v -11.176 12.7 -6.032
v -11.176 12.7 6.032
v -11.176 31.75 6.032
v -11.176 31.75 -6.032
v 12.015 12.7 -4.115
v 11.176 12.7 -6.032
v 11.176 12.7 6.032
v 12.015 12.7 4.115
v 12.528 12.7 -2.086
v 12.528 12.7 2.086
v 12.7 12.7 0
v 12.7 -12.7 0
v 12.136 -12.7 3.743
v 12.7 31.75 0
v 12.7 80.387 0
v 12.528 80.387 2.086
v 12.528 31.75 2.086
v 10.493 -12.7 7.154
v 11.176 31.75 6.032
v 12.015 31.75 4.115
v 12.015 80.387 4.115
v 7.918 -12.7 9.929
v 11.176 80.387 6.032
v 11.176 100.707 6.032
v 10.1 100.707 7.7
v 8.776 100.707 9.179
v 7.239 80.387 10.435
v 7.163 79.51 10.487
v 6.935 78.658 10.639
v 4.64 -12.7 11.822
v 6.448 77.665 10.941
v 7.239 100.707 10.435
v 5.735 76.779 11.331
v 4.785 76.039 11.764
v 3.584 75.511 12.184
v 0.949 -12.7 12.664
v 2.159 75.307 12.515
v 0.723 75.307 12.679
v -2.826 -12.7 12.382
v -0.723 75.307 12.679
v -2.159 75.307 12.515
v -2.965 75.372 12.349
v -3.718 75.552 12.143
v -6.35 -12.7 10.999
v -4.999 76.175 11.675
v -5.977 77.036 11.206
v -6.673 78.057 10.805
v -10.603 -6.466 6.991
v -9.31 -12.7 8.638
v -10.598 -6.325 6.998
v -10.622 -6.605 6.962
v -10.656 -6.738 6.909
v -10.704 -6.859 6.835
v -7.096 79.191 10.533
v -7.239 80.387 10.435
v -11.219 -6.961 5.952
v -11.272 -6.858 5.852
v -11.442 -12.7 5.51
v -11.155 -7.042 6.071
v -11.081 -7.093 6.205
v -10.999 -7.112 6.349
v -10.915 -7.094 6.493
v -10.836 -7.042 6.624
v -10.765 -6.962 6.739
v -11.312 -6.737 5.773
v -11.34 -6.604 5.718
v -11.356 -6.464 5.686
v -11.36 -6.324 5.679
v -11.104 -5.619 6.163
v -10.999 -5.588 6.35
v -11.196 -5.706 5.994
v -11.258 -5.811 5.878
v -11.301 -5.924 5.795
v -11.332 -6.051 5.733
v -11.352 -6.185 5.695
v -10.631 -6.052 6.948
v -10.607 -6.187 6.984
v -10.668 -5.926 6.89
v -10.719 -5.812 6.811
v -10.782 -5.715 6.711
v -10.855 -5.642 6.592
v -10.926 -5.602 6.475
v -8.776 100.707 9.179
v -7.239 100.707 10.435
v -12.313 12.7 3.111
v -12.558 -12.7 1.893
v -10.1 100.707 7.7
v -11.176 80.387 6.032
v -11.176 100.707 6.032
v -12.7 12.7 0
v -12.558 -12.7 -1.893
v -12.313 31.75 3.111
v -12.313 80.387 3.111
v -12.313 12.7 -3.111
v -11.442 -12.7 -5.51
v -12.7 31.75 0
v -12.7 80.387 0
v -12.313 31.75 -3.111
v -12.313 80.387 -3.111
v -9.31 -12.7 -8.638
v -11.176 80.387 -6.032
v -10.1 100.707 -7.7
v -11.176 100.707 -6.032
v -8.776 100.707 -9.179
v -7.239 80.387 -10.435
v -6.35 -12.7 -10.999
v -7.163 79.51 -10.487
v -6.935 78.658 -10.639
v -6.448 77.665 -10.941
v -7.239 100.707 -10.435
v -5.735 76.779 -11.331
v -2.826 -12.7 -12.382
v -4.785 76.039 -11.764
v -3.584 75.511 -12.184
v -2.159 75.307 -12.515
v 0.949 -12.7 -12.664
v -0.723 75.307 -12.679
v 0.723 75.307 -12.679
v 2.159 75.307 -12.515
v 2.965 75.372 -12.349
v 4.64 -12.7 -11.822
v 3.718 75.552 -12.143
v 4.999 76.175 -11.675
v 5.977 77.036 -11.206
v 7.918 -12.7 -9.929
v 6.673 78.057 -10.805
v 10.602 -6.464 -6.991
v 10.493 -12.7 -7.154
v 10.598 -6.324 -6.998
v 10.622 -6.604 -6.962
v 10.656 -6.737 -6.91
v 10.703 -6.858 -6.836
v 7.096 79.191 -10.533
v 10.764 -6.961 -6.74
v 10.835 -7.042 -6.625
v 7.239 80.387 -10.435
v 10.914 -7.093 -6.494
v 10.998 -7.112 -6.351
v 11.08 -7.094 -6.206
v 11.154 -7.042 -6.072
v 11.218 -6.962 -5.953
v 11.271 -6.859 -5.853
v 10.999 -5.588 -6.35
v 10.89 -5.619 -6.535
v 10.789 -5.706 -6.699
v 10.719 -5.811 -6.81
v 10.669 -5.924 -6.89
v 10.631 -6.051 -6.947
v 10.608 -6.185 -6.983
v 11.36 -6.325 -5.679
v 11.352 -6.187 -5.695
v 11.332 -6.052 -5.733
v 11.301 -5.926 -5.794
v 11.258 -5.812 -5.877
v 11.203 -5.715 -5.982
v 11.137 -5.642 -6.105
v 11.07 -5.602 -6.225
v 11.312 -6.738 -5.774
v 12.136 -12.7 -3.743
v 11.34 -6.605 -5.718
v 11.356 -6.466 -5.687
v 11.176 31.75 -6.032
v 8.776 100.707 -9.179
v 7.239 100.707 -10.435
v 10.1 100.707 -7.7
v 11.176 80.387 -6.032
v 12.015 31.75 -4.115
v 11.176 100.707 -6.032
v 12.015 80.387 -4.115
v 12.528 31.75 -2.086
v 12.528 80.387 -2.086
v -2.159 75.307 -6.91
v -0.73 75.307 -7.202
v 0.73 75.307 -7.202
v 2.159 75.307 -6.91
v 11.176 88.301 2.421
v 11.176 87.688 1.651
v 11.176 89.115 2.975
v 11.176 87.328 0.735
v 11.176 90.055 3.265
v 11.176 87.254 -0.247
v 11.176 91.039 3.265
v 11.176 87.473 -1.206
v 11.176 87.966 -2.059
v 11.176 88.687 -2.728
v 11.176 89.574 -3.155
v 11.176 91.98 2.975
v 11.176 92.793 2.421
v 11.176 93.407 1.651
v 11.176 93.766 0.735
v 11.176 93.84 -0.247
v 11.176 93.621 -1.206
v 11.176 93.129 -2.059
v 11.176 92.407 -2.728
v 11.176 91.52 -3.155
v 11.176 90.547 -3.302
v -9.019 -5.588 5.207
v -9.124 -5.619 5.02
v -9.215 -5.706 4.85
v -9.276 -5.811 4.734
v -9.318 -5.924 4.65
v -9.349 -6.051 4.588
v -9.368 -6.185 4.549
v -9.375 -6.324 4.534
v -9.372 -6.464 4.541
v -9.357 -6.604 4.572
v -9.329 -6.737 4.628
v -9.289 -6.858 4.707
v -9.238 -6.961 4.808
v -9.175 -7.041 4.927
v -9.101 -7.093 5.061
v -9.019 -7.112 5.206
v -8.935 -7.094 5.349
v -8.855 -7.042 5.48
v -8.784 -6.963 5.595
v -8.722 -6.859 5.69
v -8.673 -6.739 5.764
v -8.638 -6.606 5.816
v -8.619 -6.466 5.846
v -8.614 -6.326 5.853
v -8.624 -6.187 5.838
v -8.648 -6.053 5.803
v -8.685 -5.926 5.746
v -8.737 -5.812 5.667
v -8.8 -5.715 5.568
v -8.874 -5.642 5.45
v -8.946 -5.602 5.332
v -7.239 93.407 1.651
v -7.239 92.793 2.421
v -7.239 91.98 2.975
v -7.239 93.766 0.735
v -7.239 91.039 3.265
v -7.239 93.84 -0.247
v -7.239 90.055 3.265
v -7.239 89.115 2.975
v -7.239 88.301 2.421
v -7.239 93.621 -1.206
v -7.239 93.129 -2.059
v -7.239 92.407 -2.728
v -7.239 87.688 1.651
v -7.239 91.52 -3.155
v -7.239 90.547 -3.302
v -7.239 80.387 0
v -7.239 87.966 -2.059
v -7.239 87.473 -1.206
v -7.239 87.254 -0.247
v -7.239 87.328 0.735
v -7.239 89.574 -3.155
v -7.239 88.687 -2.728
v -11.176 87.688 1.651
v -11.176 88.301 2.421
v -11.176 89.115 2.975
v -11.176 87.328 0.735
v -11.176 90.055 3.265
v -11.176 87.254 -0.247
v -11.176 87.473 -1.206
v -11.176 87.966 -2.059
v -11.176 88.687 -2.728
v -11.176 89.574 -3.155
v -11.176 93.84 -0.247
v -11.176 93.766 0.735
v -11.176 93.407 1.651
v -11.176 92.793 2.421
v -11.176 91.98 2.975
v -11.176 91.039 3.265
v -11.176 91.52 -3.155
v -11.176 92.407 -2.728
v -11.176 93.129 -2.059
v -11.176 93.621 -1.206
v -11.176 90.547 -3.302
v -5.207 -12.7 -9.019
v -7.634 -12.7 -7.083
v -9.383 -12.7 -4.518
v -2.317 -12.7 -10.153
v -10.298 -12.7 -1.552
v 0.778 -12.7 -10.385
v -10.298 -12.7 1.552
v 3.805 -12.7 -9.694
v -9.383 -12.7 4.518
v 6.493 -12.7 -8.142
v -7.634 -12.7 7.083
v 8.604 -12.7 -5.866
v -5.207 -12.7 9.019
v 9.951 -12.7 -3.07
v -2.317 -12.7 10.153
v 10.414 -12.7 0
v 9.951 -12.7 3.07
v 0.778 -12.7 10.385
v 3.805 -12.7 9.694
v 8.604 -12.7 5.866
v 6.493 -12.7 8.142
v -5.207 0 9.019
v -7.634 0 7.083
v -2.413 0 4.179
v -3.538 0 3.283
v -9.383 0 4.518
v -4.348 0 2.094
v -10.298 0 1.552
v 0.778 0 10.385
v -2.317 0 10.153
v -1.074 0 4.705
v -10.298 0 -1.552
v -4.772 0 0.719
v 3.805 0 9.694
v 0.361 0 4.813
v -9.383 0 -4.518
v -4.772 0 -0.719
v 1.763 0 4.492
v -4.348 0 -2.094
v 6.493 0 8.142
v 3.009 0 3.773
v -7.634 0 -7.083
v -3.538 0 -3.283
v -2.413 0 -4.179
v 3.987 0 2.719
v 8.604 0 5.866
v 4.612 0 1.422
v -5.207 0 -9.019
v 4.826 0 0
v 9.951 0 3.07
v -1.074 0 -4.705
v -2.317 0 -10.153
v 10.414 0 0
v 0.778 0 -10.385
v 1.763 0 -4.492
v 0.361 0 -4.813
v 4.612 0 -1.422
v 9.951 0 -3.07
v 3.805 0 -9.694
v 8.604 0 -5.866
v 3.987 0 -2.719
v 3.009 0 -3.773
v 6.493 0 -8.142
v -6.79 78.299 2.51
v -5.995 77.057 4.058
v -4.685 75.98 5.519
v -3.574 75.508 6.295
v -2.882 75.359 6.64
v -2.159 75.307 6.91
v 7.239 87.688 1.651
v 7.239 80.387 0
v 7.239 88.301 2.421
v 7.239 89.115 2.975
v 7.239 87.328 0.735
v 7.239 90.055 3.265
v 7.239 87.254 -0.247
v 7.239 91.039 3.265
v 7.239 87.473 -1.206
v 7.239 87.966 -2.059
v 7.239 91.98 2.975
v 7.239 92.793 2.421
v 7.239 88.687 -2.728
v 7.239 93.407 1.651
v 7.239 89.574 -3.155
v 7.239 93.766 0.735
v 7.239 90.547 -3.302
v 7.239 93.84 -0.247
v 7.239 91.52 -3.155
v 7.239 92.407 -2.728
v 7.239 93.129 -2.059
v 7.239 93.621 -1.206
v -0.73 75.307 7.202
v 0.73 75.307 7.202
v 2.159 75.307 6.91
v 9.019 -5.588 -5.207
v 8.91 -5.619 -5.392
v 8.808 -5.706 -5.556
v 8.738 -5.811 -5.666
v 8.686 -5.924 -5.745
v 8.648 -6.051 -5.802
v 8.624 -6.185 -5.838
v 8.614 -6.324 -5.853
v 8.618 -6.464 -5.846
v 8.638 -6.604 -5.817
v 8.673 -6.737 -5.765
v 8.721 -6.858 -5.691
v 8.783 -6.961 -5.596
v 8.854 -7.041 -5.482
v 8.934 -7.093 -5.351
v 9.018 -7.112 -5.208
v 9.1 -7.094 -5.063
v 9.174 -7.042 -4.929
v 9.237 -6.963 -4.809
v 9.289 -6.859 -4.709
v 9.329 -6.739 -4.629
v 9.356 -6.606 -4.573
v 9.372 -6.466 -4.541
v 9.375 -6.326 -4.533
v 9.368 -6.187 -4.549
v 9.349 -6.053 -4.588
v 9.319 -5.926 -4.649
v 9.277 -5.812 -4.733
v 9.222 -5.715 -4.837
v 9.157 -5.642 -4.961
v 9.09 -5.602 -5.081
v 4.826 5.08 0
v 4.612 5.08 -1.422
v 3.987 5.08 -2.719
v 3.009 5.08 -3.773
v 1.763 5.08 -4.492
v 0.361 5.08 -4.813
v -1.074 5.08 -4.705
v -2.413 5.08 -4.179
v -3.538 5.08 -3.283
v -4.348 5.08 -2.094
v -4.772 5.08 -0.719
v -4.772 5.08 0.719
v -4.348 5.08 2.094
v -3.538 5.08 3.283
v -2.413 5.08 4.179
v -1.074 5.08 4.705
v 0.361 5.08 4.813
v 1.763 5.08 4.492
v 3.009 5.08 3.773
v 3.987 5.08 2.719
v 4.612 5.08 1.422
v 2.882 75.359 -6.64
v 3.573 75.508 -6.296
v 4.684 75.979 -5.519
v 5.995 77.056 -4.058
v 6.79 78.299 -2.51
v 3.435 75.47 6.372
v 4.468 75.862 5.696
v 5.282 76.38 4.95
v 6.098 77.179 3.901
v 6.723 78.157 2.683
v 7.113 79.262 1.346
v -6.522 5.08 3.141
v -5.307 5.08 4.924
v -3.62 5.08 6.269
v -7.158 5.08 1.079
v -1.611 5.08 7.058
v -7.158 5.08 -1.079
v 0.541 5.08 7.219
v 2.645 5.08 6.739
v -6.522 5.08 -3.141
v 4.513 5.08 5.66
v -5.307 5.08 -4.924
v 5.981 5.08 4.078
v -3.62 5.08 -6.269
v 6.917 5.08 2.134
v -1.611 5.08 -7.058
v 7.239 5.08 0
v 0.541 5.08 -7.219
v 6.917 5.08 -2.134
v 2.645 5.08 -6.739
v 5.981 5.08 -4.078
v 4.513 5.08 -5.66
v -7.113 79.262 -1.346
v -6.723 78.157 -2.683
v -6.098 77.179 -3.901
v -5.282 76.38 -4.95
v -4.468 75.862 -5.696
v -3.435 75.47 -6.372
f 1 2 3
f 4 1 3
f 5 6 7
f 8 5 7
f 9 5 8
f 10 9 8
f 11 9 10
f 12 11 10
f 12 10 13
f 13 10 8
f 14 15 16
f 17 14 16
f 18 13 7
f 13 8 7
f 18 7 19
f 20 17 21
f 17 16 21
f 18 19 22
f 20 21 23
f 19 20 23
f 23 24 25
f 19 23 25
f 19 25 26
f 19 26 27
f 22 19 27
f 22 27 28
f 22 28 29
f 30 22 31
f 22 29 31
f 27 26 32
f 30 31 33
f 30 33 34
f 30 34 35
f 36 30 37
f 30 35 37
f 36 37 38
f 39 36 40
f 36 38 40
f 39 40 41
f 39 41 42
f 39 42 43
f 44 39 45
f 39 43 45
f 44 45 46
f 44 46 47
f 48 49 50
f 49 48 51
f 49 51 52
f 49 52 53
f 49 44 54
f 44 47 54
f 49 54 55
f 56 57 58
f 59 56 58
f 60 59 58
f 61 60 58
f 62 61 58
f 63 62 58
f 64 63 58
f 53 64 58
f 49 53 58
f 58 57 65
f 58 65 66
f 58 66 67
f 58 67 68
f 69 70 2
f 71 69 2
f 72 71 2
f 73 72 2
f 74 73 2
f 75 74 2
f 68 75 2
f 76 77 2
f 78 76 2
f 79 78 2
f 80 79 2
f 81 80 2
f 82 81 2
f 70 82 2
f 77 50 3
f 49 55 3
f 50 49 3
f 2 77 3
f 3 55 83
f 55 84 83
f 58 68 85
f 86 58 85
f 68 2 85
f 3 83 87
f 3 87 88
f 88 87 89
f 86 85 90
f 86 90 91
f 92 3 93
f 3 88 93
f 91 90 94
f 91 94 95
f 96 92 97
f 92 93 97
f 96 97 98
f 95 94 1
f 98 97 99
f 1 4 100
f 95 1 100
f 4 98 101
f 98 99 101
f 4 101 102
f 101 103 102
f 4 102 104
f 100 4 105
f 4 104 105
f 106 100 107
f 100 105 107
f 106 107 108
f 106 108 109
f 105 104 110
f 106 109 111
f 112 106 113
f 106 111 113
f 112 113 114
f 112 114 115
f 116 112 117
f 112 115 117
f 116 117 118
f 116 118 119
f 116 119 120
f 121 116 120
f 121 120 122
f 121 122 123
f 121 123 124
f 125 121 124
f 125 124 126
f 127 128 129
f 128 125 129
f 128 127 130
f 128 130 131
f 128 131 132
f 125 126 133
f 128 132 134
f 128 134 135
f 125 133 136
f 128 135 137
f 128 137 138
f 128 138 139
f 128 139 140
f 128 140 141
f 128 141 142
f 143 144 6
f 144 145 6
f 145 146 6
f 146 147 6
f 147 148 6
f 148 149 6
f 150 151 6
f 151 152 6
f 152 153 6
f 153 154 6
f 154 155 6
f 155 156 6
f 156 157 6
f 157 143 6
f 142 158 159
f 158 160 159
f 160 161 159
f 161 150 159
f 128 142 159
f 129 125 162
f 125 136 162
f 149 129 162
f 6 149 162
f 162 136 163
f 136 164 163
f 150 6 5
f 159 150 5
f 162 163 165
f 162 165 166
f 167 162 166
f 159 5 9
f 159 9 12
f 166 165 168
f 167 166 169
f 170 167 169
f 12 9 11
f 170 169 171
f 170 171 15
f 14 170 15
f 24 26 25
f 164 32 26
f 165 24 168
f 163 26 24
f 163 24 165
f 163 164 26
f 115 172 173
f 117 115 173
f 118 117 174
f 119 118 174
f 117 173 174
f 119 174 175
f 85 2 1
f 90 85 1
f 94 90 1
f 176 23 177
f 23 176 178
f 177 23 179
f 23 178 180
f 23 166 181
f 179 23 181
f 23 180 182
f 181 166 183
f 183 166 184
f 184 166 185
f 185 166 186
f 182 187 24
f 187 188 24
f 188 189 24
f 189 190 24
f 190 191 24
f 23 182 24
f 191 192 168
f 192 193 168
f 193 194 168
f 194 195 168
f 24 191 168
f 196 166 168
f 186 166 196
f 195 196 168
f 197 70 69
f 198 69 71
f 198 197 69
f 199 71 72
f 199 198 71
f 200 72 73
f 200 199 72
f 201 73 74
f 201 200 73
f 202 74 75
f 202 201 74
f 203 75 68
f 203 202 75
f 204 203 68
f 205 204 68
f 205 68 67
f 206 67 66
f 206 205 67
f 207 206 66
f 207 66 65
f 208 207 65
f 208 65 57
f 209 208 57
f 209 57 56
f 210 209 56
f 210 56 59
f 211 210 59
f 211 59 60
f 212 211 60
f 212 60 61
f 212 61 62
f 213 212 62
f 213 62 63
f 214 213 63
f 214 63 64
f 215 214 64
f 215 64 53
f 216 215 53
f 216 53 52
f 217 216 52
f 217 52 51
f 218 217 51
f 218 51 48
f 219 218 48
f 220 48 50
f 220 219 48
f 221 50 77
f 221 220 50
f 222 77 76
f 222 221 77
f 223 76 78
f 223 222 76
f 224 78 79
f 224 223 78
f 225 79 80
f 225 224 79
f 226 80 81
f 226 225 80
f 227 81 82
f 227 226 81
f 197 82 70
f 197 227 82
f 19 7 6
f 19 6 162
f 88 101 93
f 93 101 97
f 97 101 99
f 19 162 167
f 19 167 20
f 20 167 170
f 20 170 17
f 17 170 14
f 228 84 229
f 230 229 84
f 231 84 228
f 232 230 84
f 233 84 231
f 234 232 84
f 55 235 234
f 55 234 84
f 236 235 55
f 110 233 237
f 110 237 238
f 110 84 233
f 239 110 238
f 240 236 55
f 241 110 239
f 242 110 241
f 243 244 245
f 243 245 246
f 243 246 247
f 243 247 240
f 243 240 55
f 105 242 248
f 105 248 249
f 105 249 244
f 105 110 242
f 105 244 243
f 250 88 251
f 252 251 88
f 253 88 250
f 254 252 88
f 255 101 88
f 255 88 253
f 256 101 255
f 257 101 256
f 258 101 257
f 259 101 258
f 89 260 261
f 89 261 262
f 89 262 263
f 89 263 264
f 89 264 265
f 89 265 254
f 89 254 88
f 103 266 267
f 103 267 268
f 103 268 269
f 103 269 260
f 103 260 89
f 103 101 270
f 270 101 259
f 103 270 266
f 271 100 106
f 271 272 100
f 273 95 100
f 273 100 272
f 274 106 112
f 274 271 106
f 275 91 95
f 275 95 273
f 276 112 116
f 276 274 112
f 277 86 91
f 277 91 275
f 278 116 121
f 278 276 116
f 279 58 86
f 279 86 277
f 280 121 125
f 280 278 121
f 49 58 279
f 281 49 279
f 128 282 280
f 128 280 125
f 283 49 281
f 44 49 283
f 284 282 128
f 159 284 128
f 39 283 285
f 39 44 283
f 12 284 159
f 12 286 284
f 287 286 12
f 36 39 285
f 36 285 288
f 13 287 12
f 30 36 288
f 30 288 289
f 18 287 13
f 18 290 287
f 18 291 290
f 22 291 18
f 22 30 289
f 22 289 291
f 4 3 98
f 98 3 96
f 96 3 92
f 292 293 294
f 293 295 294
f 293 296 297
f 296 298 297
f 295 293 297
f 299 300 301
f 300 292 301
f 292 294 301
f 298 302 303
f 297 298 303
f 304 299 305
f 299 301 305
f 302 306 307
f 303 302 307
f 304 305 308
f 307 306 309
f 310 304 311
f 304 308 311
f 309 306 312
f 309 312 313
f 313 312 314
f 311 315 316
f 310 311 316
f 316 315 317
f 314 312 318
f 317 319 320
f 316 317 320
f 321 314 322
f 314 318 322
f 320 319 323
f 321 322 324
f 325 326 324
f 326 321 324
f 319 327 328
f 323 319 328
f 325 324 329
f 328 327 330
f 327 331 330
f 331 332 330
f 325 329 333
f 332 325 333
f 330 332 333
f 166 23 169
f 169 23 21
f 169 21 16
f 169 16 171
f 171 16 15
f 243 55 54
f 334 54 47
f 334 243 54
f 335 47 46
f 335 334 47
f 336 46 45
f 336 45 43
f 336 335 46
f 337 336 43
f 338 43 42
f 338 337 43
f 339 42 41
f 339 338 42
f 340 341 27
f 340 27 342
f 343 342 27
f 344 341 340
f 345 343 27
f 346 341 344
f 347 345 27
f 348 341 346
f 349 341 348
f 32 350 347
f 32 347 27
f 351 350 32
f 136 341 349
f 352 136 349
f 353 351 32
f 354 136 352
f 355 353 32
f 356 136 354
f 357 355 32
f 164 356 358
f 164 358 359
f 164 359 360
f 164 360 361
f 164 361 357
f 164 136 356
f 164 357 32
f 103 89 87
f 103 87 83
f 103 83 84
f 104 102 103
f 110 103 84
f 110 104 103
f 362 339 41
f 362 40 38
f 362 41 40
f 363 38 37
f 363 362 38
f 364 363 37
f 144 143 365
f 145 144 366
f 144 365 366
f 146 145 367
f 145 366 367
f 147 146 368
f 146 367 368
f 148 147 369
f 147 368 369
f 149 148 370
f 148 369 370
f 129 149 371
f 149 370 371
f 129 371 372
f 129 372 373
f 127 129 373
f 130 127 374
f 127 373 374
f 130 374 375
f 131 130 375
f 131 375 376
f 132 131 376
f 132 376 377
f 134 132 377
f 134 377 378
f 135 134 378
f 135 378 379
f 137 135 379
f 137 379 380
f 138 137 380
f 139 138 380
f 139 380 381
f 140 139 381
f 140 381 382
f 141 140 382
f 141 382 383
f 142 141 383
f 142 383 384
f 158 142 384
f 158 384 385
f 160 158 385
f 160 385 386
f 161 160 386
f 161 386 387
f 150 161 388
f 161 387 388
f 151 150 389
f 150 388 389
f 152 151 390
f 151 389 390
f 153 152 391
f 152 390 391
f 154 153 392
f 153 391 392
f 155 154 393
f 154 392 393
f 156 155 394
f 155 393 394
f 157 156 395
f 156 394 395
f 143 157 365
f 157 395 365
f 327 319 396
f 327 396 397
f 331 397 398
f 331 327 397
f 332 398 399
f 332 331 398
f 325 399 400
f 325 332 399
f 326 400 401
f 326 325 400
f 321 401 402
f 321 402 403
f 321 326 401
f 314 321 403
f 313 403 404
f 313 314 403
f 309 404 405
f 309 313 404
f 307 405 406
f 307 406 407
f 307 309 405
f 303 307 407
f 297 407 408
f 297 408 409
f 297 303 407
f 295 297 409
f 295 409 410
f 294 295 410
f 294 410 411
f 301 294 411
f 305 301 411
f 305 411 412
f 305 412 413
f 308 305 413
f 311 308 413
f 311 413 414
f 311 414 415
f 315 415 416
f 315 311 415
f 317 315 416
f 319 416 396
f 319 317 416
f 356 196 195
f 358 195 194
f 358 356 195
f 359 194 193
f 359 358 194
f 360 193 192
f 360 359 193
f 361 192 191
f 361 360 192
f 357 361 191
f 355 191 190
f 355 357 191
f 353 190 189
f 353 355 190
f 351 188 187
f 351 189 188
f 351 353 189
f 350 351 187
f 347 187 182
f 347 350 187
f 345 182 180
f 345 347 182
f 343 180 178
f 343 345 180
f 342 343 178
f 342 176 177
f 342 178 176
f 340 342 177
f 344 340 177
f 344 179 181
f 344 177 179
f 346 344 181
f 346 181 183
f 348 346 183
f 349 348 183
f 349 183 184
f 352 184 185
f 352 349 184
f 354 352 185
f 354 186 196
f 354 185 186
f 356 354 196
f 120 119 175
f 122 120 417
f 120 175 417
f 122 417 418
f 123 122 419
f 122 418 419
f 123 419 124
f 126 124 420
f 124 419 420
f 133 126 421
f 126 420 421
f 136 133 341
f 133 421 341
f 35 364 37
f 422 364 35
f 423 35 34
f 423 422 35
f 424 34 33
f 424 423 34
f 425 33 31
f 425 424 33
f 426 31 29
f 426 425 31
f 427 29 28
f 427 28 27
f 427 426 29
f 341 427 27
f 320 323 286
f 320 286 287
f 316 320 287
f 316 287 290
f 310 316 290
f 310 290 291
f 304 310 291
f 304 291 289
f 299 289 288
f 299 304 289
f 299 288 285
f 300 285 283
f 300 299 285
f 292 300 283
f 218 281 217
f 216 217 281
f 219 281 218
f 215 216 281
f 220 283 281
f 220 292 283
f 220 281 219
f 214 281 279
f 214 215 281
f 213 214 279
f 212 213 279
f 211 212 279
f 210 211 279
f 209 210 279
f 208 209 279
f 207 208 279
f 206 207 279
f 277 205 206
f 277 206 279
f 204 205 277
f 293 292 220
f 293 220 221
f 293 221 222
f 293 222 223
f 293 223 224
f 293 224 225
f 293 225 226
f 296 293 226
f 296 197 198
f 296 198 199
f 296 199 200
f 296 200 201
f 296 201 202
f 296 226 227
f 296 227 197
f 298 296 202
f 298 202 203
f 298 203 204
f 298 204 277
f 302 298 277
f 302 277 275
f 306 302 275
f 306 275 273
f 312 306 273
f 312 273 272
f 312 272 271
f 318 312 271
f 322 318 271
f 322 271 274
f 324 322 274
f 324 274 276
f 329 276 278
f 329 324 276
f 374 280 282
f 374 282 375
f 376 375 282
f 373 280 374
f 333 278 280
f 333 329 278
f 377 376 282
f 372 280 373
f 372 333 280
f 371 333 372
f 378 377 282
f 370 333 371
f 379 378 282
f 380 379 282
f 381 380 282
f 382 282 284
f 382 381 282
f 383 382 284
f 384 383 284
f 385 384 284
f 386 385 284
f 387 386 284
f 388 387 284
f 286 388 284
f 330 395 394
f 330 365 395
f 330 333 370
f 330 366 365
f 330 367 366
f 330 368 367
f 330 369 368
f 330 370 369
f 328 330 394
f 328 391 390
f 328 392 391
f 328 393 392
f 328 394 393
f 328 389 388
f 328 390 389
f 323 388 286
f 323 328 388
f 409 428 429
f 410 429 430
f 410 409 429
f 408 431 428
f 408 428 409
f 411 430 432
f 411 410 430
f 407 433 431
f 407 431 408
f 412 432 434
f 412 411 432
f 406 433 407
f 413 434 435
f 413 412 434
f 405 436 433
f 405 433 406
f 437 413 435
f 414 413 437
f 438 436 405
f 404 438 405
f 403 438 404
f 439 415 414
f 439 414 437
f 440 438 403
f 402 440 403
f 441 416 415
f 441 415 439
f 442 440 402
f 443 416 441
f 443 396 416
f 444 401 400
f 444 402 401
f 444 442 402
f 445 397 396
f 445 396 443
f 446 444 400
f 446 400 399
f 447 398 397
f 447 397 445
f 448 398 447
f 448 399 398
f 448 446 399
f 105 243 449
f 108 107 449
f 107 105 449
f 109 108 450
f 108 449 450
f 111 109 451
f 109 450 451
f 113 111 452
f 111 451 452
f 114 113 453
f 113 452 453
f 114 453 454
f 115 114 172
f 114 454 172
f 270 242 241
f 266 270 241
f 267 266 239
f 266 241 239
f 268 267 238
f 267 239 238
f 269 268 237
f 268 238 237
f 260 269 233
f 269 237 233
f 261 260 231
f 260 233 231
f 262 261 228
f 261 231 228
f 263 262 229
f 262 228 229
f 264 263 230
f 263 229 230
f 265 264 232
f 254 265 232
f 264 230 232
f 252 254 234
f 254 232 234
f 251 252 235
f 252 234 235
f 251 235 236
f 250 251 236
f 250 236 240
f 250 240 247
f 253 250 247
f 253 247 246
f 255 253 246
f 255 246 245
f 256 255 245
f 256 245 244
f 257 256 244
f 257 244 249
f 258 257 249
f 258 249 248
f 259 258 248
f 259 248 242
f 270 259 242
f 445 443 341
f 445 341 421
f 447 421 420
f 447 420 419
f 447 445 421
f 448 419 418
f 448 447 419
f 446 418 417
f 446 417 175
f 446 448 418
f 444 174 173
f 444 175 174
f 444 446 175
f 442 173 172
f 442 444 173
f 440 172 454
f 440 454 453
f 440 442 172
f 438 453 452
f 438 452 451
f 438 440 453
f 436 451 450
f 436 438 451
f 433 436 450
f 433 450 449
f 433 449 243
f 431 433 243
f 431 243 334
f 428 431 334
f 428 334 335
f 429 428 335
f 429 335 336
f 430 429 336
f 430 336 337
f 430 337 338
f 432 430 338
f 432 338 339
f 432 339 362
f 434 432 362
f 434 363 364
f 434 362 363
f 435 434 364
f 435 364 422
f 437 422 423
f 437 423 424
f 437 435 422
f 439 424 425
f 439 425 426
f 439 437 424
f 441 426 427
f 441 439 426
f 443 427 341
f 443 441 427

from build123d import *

# Parameters (mm, degrees)
SKETCH1_R                                     = 12.7
SKETCH1_R_2                                   = 4.826
SOCKET_HEAD_STOP_DEPTH                        = 5.08
SKETCH2_R                                     = 12.7
SKETCH2_R_2                                   = 7.239
MAIN_BODY_DEPTH                               = 100.70719
SKETCH6_R                                     = 3.302
ROD_END_MOUNTING_HOLES_DEPTH                  = 13.7
ROD_END_MOUNTING_HOLES_DEPTH_BACK             = 13.7
SKETCH3_W                                     = 1.524
SKETCH3_H                                     = 19.05
SKETCH3_H_2                                   = 20.32
ROD_END_BODY_HOLES_AND_WRENCH_CUTS_DEPTH      = 13.7000001
ROD_END_BODY_HOLES_AND_WRENCH_CUTS_DEPTH_BACK = 13.7000001
SKETCH4_R                                     = 12.7
SKETCH4_R_2                                   = 10.414
RACK_COVER_DEPTH                              = 12.7
SKETCH7_R                                     = 0.762
SAFETY_WIRE_HOLES_DEPTH                       = 18.348522765
SAFETY_WIRE_HOLES_DEPTH_BACK                  = 18.348522765


with BuildPart() as part:
    # Sketch1 → Socket Head Stop (new body)
    with BuildSketch(Plane(origin=(0, 0, 0), x_dir=(1, 0, 0), z_dir=(0, 1, 0))):
        Circle(SKETCH1_R)
        Circle(SKETCH1_R_2, mode=Mode.SUBTRACT)
    extrude(amount=SOCKET_HEAD_STOP_DEPTH)

    # Sketch2 → Main Body (add)
    with BuildSketch(Plane(origin=(0, 0, 0), x_dir=(1, 0, 0), z_dir=(0, 1, 0))):
        Circle(SKETCH2_R)
        Circle(SKETCH2_R_2, mode=Mode.SUBTRACT)
    extrude(amount=MAIN_BODY_DEPTH)

    # Sketch6 → Rod End Mounting Holes (cut, two sides)
    with BuildSketch(Plane(origin=(0, 0, 0), x_dir=(0, 0, -1), z_dir=(1, 0, 0))) as rod_end_mounting_holes_sk:
        with Locations((0, 90.54719)):
            Circle(SKETCH6_R)
    extrude(amount=ROD_END_MOUNTING_HOLES_DEPTH, mode=Mode.SUBTRACT)
    extrude(rod_end_mounting_holes_sk.sketch, amount=-ROD_END_MOUNTING_HOLES_DEPTH_BACK, mode=Mode.SUBTRACT)

    # Sketch3 → Rod End Body Holes And Wrench Cuts (cut, two sides)
    with BuildSketch(Plane.XY) as rod_end_body_holes_and_wrench_cuts_sk:
        with BuildLine():
            Line((7.239, 100.70719), (-7.239, 100.70719))
            Line((-7.239, 100.70719), (-7.239, 80.38719))
            ThreePointArc((-7.239, 80.38719), (-5.751102448, 76.795087552), (-2.159, 75.30719))
            Line((-2.159, 75.30719), (2.159, 75.30719))
            ThreePointArc((2.159, 75.30719), (5.751102448, 76.795087552), (7.239, 80.38719))
            Line((7.239, 80.38719), (7.239, 100.70719))
        make_face()
        with Locations((11.938, 22.225)):
            Rectangle(SKETCH3_W, SKETCH3_H)
        with Locations((-11.938, 90.54719)):
            Rectangle(SKETCH3_W, SKETCH3_H_2)
        with Locations((11.938, 90.54719)):
            Rectangle(SKETCH3_W, SKETCH3_H_2)
        with Locations((-11.938, 22.225)):
            Rectangle(SKETCH3_W, SKETCH3_H)
    extrude(amount=ROD_END_BODY_HOLES_AND_WRENCH_CUTS_DEPTH, mode=Mode.SUBTRACT)
    extrude(rod_end_body_holes_and_wrench_cuts_sk.sketch, amount=-ROD_END_BODY_HOLES_AND_WRENCH_CUTS_DEPTH_BACK, mode=Mode.SUBTRACT)

    # Sketch4 → Rack Cover (add)
    with BuildSketch(Plane.XZ):
        Circle(SKETCH4_R)
        Circle(SKETCH4_R_2, mode=Mode.SUBTRACT)
    extrude(amount=RACK_COVER_DEPTH)

    # Sketch7 → Safety Wire Holes (cut, two sides)
    with BuildSketch(Plane(origin=(0, 0, 0), x_dir=(0, 1, 0), z_dir=(-0.866025404, 0, 0.5))) as safety_wire_holes_sk:
        with Locations((-6.35, 0)):
            Circle(SKETCH7_R)
    extrude(amount=SAFETY_WIRE_HOLES_DEPTH, mode=Mode.SUBTRACT)
    extrude(safety_wire_holes_sk.sketch, amount=-SAFETY_WIRE_HOLES_DEPTH_BACK, mode=Mode.SUBTRACT)


solid = part.part
